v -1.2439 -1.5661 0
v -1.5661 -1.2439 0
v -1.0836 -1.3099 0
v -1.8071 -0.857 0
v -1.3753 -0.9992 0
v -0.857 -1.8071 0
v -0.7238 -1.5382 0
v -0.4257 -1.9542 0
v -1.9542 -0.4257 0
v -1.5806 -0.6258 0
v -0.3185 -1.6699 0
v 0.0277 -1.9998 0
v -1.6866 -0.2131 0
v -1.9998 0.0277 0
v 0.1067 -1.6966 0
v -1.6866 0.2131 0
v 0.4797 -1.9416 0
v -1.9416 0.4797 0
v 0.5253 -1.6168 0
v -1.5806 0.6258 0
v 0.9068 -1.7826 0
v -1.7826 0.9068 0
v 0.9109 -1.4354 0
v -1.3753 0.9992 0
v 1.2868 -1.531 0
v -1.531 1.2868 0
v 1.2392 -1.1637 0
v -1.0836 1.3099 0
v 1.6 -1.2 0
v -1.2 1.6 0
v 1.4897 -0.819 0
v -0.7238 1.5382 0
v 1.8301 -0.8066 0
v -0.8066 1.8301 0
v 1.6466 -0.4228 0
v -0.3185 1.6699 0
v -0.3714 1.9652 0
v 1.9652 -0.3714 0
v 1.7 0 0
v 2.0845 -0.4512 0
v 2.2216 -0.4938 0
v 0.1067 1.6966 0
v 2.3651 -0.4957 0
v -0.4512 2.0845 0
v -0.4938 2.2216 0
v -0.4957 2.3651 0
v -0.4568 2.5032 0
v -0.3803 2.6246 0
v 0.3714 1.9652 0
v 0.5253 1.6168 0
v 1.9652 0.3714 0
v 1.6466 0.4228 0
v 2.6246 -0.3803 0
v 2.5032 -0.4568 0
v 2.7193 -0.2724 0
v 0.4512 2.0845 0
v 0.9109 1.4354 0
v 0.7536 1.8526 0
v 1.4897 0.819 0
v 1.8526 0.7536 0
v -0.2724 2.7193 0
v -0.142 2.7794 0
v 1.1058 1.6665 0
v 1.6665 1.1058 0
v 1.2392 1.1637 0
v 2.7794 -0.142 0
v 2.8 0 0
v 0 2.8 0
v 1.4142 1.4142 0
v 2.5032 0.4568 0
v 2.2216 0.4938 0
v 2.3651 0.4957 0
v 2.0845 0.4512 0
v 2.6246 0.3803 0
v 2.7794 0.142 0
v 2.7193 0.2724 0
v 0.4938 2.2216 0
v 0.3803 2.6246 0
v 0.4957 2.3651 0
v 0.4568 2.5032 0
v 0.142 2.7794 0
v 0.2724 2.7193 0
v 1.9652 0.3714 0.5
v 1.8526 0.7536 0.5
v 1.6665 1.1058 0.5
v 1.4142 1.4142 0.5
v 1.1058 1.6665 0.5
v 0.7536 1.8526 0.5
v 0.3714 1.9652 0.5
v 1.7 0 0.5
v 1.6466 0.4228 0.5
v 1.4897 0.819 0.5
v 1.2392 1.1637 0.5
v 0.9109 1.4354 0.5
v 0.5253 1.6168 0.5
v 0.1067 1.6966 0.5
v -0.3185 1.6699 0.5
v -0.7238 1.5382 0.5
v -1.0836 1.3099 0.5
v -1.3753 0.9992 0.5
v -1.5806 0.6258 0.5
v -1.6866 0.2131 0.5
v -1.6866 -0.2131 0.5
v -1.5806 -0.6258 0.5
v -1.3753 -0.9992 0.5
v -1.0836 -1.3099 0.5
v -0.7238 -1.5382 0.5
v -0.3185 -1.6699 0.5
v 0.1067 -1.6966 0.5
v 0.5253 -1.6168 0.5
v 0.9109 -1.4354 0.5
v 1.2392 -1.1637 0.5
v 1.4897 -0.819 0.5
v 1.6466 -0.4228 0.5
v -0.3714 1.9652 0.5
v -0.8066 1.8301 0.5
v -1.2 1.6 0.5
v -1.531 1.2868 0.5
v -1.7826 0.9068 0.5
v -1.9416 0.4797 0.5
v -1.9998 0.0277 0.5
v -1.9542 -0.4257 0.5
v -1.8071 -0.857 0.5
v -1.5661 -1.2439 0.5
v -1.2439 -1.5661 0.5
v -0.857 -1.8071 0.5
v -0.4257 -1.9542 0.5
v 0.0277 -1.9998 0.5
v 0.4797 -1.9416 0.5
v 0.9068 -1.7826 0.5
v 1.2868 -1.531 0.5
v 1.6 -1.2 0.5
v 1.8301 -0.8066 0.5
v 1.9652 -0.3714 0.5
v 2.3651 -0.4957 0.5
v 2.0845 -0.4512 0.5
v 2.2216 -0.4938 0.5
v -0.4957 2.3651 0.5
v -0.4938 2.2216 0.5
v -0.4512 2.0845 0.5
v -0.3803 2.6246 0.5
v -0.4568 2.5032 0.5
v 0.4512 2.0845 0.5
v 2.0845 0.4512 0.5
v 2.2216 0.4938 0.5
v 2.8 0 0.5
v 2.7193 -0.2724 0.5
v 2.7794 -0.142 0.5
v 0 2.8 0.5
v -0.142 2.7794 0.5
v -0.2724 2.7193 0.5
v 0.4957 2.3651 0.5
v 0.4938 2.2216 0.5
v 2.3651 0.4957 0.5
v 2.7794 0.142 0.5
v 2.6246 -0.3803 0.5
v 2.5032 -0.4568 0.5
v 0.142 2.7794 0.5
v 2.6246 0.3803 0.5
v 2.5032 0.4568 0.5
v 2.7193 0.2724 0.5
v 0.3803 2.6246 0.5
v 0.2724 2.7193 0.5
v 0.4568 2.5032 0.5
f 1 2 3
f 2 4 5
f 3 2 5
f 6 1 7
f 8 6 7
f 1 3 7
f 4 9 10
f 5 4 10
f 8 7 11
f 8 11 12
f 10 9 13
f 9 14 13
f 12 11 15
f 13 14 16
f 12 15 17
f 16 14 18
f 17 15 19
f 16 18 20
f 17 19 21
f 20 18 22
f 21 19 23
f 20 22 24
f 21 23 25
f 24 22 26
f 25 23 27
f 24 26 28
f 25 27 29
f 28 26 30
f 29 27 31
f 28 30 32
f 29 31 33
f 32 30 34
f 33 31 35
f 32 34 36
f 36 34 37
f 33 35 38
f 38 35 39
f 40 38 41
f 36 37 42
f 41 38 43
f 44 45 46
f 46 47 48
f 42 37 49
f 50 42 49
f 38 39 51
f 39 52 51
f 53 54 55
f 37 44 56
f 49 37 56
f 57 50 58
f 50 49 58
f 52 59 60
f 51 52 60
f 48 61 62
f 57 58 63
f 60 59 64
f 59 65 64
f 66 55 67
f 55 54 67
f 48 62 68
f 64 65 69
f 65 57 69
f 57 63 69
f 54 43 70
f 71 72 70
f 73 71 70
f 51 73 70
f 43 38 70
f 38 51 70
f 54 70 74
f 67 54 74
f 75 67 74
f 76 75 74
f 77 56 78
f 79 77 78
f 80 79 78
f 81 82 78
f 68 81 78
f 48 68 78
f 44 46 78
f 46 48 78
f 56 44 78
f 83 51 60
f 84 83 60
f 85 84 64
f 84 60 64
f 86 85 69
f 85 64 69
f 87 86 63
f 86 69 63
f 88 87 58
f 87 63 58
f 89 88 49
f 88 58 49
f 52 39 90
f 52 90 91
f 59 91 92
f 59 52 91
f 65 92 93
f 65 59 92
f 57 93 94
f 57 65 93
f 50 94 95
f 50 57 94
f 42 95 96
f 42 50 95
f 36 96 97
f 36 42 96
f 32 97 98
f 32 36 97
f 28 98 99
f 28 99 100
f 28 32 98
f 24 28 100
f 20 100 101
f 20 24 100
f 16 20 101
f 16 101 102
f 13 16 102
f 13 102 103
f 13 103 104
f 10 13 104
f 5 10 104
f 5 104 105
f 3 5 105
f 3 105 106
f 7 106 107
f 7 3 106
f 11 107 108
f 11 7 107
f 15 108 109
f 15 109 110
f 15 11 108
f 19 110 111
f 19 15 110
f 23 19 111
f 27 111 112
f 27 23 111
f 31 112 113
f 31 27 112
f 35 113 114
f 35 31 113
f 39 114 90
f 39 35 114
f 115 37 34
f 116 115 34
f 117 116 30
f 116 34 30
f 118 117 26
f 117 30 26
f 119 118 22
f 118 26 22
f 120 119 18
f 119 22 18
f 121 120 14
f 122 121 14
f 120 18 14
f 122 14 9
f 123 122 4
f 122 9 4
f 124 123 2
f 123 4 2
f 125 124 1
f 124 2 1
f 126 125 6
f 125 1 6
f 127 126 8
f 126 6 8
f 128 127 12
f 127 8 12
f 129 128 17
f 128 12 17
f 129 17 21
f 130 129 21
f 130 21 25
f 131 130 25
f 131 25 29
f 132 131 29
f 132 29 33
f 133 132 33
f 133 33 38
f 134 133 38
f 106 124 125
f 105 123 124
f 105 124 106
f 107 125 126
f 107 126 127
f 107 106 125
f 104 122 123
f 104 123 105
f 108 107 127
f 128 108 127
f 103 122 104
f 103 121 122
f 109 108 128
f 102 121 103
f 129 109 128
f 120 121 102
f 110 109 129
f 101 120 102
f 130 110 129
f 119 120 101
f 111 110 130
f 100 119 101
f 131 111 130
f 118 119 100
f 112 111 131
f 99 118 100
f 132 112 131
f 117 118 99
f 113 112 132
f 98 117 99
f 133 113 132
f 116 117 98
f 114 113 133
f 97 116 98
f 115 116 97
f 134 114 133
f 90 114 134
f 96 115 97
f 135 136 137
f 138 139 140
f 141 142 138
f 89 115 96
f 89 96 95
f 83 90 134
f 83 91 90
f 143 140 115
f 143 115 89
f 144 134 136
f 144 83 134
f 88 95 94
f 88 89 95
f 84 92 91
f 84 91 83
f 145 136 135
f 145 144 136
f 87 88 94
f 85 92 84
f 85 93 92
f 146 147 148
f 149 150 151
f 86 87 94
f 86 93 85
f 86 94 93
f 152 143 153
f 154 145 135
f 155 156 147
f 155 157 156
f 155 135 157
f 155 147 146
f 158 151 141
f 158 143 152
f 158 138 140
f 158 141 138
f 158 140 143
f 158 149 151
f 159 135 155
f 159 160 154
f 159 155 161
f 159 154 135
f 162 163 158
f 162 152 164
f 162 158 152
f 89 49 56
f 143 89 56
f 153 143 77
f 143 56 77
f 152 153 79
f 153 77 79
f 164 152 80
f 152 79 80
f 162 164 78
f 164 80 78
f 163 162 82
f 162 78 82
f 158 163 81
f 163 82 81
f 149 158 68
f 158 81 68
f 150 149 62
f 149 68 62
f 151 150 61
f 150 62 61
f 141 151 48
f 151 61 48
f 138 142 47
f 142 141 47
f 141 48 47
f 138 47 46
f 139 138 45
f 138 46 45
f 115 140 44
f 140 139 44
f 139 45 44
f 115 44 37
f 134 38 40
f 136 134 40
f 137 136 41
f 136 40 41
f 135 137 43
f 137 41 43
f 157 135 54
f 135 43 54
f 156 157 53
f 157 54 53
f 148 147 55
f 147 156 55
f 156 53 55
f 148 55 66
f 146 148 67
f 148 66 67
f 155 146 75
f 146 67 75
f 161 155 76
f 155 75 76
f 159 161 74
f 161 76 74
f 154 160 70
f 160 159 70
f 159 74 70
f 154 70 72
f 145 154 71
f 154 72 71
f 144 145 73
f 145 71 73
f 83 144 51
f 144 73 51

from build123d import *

# Parameters (mm, degrees)
CYLINDER003_R     = 0.5
CYLINDER003_DEPTH = 0.5
CYLINDER002_R     = 0.5
CYLINDER002_DEPTH = 0.5
CYLINDER001_R     = 1.7
CYLINDER001_DEPTH = 0.5
CYLINDER_R        = 2
CYLINDER_DEPTH    = 0.5


with BuildPart() as cilindro003:
    # Cylinder003 → Cylinder003 (new body)
    with BuildSketch(Plane(origin=(0, 2.3, 0), x_dir=(1, 0, 0), z_dir=(0, 0, 1))):
        Circle(CYLINDER003_R)
    extrude(amount=CYLINDER003_DEPTH)


with BuildPart() as cilindro002:
    # Cylinder002 → Cylinder002 (new body)
    with BuildSketch(Plane(origin=(2.3, 0, 0), x_dir=(1, 0, 0), z_dir=(0, 0, 1))):
        Circle(CYLINDER002_R)
    extrude(amount=CYLINDER002_DEPTH)


with BuildPart() as cilindro001:
    # Cylinder001 → Cylinder001 (new body)
    with BuildSketch(Plane.XY):
        Circle(CYLINDER001_R)
    extrude(amount=CYLINDER001_DEPTH)


with BuildPart() as fusion001:
    # Cylinder → Cylinder (new body)
    with BuildSketch(Plane.XY):
        Circle(CYLINDER_R)
    extrude(amount=CYLINDER_DEPTH)

    # Cut: cut Cilindro001
    add(cilindro001.part, mode=Mode.SUBTRACT)

    # Fusion: union Cilindro002
    add(cilindro002.part)

    # Fusion001: union Cilindro003
    add(cilindro003.part)


solid = fusion001.part
